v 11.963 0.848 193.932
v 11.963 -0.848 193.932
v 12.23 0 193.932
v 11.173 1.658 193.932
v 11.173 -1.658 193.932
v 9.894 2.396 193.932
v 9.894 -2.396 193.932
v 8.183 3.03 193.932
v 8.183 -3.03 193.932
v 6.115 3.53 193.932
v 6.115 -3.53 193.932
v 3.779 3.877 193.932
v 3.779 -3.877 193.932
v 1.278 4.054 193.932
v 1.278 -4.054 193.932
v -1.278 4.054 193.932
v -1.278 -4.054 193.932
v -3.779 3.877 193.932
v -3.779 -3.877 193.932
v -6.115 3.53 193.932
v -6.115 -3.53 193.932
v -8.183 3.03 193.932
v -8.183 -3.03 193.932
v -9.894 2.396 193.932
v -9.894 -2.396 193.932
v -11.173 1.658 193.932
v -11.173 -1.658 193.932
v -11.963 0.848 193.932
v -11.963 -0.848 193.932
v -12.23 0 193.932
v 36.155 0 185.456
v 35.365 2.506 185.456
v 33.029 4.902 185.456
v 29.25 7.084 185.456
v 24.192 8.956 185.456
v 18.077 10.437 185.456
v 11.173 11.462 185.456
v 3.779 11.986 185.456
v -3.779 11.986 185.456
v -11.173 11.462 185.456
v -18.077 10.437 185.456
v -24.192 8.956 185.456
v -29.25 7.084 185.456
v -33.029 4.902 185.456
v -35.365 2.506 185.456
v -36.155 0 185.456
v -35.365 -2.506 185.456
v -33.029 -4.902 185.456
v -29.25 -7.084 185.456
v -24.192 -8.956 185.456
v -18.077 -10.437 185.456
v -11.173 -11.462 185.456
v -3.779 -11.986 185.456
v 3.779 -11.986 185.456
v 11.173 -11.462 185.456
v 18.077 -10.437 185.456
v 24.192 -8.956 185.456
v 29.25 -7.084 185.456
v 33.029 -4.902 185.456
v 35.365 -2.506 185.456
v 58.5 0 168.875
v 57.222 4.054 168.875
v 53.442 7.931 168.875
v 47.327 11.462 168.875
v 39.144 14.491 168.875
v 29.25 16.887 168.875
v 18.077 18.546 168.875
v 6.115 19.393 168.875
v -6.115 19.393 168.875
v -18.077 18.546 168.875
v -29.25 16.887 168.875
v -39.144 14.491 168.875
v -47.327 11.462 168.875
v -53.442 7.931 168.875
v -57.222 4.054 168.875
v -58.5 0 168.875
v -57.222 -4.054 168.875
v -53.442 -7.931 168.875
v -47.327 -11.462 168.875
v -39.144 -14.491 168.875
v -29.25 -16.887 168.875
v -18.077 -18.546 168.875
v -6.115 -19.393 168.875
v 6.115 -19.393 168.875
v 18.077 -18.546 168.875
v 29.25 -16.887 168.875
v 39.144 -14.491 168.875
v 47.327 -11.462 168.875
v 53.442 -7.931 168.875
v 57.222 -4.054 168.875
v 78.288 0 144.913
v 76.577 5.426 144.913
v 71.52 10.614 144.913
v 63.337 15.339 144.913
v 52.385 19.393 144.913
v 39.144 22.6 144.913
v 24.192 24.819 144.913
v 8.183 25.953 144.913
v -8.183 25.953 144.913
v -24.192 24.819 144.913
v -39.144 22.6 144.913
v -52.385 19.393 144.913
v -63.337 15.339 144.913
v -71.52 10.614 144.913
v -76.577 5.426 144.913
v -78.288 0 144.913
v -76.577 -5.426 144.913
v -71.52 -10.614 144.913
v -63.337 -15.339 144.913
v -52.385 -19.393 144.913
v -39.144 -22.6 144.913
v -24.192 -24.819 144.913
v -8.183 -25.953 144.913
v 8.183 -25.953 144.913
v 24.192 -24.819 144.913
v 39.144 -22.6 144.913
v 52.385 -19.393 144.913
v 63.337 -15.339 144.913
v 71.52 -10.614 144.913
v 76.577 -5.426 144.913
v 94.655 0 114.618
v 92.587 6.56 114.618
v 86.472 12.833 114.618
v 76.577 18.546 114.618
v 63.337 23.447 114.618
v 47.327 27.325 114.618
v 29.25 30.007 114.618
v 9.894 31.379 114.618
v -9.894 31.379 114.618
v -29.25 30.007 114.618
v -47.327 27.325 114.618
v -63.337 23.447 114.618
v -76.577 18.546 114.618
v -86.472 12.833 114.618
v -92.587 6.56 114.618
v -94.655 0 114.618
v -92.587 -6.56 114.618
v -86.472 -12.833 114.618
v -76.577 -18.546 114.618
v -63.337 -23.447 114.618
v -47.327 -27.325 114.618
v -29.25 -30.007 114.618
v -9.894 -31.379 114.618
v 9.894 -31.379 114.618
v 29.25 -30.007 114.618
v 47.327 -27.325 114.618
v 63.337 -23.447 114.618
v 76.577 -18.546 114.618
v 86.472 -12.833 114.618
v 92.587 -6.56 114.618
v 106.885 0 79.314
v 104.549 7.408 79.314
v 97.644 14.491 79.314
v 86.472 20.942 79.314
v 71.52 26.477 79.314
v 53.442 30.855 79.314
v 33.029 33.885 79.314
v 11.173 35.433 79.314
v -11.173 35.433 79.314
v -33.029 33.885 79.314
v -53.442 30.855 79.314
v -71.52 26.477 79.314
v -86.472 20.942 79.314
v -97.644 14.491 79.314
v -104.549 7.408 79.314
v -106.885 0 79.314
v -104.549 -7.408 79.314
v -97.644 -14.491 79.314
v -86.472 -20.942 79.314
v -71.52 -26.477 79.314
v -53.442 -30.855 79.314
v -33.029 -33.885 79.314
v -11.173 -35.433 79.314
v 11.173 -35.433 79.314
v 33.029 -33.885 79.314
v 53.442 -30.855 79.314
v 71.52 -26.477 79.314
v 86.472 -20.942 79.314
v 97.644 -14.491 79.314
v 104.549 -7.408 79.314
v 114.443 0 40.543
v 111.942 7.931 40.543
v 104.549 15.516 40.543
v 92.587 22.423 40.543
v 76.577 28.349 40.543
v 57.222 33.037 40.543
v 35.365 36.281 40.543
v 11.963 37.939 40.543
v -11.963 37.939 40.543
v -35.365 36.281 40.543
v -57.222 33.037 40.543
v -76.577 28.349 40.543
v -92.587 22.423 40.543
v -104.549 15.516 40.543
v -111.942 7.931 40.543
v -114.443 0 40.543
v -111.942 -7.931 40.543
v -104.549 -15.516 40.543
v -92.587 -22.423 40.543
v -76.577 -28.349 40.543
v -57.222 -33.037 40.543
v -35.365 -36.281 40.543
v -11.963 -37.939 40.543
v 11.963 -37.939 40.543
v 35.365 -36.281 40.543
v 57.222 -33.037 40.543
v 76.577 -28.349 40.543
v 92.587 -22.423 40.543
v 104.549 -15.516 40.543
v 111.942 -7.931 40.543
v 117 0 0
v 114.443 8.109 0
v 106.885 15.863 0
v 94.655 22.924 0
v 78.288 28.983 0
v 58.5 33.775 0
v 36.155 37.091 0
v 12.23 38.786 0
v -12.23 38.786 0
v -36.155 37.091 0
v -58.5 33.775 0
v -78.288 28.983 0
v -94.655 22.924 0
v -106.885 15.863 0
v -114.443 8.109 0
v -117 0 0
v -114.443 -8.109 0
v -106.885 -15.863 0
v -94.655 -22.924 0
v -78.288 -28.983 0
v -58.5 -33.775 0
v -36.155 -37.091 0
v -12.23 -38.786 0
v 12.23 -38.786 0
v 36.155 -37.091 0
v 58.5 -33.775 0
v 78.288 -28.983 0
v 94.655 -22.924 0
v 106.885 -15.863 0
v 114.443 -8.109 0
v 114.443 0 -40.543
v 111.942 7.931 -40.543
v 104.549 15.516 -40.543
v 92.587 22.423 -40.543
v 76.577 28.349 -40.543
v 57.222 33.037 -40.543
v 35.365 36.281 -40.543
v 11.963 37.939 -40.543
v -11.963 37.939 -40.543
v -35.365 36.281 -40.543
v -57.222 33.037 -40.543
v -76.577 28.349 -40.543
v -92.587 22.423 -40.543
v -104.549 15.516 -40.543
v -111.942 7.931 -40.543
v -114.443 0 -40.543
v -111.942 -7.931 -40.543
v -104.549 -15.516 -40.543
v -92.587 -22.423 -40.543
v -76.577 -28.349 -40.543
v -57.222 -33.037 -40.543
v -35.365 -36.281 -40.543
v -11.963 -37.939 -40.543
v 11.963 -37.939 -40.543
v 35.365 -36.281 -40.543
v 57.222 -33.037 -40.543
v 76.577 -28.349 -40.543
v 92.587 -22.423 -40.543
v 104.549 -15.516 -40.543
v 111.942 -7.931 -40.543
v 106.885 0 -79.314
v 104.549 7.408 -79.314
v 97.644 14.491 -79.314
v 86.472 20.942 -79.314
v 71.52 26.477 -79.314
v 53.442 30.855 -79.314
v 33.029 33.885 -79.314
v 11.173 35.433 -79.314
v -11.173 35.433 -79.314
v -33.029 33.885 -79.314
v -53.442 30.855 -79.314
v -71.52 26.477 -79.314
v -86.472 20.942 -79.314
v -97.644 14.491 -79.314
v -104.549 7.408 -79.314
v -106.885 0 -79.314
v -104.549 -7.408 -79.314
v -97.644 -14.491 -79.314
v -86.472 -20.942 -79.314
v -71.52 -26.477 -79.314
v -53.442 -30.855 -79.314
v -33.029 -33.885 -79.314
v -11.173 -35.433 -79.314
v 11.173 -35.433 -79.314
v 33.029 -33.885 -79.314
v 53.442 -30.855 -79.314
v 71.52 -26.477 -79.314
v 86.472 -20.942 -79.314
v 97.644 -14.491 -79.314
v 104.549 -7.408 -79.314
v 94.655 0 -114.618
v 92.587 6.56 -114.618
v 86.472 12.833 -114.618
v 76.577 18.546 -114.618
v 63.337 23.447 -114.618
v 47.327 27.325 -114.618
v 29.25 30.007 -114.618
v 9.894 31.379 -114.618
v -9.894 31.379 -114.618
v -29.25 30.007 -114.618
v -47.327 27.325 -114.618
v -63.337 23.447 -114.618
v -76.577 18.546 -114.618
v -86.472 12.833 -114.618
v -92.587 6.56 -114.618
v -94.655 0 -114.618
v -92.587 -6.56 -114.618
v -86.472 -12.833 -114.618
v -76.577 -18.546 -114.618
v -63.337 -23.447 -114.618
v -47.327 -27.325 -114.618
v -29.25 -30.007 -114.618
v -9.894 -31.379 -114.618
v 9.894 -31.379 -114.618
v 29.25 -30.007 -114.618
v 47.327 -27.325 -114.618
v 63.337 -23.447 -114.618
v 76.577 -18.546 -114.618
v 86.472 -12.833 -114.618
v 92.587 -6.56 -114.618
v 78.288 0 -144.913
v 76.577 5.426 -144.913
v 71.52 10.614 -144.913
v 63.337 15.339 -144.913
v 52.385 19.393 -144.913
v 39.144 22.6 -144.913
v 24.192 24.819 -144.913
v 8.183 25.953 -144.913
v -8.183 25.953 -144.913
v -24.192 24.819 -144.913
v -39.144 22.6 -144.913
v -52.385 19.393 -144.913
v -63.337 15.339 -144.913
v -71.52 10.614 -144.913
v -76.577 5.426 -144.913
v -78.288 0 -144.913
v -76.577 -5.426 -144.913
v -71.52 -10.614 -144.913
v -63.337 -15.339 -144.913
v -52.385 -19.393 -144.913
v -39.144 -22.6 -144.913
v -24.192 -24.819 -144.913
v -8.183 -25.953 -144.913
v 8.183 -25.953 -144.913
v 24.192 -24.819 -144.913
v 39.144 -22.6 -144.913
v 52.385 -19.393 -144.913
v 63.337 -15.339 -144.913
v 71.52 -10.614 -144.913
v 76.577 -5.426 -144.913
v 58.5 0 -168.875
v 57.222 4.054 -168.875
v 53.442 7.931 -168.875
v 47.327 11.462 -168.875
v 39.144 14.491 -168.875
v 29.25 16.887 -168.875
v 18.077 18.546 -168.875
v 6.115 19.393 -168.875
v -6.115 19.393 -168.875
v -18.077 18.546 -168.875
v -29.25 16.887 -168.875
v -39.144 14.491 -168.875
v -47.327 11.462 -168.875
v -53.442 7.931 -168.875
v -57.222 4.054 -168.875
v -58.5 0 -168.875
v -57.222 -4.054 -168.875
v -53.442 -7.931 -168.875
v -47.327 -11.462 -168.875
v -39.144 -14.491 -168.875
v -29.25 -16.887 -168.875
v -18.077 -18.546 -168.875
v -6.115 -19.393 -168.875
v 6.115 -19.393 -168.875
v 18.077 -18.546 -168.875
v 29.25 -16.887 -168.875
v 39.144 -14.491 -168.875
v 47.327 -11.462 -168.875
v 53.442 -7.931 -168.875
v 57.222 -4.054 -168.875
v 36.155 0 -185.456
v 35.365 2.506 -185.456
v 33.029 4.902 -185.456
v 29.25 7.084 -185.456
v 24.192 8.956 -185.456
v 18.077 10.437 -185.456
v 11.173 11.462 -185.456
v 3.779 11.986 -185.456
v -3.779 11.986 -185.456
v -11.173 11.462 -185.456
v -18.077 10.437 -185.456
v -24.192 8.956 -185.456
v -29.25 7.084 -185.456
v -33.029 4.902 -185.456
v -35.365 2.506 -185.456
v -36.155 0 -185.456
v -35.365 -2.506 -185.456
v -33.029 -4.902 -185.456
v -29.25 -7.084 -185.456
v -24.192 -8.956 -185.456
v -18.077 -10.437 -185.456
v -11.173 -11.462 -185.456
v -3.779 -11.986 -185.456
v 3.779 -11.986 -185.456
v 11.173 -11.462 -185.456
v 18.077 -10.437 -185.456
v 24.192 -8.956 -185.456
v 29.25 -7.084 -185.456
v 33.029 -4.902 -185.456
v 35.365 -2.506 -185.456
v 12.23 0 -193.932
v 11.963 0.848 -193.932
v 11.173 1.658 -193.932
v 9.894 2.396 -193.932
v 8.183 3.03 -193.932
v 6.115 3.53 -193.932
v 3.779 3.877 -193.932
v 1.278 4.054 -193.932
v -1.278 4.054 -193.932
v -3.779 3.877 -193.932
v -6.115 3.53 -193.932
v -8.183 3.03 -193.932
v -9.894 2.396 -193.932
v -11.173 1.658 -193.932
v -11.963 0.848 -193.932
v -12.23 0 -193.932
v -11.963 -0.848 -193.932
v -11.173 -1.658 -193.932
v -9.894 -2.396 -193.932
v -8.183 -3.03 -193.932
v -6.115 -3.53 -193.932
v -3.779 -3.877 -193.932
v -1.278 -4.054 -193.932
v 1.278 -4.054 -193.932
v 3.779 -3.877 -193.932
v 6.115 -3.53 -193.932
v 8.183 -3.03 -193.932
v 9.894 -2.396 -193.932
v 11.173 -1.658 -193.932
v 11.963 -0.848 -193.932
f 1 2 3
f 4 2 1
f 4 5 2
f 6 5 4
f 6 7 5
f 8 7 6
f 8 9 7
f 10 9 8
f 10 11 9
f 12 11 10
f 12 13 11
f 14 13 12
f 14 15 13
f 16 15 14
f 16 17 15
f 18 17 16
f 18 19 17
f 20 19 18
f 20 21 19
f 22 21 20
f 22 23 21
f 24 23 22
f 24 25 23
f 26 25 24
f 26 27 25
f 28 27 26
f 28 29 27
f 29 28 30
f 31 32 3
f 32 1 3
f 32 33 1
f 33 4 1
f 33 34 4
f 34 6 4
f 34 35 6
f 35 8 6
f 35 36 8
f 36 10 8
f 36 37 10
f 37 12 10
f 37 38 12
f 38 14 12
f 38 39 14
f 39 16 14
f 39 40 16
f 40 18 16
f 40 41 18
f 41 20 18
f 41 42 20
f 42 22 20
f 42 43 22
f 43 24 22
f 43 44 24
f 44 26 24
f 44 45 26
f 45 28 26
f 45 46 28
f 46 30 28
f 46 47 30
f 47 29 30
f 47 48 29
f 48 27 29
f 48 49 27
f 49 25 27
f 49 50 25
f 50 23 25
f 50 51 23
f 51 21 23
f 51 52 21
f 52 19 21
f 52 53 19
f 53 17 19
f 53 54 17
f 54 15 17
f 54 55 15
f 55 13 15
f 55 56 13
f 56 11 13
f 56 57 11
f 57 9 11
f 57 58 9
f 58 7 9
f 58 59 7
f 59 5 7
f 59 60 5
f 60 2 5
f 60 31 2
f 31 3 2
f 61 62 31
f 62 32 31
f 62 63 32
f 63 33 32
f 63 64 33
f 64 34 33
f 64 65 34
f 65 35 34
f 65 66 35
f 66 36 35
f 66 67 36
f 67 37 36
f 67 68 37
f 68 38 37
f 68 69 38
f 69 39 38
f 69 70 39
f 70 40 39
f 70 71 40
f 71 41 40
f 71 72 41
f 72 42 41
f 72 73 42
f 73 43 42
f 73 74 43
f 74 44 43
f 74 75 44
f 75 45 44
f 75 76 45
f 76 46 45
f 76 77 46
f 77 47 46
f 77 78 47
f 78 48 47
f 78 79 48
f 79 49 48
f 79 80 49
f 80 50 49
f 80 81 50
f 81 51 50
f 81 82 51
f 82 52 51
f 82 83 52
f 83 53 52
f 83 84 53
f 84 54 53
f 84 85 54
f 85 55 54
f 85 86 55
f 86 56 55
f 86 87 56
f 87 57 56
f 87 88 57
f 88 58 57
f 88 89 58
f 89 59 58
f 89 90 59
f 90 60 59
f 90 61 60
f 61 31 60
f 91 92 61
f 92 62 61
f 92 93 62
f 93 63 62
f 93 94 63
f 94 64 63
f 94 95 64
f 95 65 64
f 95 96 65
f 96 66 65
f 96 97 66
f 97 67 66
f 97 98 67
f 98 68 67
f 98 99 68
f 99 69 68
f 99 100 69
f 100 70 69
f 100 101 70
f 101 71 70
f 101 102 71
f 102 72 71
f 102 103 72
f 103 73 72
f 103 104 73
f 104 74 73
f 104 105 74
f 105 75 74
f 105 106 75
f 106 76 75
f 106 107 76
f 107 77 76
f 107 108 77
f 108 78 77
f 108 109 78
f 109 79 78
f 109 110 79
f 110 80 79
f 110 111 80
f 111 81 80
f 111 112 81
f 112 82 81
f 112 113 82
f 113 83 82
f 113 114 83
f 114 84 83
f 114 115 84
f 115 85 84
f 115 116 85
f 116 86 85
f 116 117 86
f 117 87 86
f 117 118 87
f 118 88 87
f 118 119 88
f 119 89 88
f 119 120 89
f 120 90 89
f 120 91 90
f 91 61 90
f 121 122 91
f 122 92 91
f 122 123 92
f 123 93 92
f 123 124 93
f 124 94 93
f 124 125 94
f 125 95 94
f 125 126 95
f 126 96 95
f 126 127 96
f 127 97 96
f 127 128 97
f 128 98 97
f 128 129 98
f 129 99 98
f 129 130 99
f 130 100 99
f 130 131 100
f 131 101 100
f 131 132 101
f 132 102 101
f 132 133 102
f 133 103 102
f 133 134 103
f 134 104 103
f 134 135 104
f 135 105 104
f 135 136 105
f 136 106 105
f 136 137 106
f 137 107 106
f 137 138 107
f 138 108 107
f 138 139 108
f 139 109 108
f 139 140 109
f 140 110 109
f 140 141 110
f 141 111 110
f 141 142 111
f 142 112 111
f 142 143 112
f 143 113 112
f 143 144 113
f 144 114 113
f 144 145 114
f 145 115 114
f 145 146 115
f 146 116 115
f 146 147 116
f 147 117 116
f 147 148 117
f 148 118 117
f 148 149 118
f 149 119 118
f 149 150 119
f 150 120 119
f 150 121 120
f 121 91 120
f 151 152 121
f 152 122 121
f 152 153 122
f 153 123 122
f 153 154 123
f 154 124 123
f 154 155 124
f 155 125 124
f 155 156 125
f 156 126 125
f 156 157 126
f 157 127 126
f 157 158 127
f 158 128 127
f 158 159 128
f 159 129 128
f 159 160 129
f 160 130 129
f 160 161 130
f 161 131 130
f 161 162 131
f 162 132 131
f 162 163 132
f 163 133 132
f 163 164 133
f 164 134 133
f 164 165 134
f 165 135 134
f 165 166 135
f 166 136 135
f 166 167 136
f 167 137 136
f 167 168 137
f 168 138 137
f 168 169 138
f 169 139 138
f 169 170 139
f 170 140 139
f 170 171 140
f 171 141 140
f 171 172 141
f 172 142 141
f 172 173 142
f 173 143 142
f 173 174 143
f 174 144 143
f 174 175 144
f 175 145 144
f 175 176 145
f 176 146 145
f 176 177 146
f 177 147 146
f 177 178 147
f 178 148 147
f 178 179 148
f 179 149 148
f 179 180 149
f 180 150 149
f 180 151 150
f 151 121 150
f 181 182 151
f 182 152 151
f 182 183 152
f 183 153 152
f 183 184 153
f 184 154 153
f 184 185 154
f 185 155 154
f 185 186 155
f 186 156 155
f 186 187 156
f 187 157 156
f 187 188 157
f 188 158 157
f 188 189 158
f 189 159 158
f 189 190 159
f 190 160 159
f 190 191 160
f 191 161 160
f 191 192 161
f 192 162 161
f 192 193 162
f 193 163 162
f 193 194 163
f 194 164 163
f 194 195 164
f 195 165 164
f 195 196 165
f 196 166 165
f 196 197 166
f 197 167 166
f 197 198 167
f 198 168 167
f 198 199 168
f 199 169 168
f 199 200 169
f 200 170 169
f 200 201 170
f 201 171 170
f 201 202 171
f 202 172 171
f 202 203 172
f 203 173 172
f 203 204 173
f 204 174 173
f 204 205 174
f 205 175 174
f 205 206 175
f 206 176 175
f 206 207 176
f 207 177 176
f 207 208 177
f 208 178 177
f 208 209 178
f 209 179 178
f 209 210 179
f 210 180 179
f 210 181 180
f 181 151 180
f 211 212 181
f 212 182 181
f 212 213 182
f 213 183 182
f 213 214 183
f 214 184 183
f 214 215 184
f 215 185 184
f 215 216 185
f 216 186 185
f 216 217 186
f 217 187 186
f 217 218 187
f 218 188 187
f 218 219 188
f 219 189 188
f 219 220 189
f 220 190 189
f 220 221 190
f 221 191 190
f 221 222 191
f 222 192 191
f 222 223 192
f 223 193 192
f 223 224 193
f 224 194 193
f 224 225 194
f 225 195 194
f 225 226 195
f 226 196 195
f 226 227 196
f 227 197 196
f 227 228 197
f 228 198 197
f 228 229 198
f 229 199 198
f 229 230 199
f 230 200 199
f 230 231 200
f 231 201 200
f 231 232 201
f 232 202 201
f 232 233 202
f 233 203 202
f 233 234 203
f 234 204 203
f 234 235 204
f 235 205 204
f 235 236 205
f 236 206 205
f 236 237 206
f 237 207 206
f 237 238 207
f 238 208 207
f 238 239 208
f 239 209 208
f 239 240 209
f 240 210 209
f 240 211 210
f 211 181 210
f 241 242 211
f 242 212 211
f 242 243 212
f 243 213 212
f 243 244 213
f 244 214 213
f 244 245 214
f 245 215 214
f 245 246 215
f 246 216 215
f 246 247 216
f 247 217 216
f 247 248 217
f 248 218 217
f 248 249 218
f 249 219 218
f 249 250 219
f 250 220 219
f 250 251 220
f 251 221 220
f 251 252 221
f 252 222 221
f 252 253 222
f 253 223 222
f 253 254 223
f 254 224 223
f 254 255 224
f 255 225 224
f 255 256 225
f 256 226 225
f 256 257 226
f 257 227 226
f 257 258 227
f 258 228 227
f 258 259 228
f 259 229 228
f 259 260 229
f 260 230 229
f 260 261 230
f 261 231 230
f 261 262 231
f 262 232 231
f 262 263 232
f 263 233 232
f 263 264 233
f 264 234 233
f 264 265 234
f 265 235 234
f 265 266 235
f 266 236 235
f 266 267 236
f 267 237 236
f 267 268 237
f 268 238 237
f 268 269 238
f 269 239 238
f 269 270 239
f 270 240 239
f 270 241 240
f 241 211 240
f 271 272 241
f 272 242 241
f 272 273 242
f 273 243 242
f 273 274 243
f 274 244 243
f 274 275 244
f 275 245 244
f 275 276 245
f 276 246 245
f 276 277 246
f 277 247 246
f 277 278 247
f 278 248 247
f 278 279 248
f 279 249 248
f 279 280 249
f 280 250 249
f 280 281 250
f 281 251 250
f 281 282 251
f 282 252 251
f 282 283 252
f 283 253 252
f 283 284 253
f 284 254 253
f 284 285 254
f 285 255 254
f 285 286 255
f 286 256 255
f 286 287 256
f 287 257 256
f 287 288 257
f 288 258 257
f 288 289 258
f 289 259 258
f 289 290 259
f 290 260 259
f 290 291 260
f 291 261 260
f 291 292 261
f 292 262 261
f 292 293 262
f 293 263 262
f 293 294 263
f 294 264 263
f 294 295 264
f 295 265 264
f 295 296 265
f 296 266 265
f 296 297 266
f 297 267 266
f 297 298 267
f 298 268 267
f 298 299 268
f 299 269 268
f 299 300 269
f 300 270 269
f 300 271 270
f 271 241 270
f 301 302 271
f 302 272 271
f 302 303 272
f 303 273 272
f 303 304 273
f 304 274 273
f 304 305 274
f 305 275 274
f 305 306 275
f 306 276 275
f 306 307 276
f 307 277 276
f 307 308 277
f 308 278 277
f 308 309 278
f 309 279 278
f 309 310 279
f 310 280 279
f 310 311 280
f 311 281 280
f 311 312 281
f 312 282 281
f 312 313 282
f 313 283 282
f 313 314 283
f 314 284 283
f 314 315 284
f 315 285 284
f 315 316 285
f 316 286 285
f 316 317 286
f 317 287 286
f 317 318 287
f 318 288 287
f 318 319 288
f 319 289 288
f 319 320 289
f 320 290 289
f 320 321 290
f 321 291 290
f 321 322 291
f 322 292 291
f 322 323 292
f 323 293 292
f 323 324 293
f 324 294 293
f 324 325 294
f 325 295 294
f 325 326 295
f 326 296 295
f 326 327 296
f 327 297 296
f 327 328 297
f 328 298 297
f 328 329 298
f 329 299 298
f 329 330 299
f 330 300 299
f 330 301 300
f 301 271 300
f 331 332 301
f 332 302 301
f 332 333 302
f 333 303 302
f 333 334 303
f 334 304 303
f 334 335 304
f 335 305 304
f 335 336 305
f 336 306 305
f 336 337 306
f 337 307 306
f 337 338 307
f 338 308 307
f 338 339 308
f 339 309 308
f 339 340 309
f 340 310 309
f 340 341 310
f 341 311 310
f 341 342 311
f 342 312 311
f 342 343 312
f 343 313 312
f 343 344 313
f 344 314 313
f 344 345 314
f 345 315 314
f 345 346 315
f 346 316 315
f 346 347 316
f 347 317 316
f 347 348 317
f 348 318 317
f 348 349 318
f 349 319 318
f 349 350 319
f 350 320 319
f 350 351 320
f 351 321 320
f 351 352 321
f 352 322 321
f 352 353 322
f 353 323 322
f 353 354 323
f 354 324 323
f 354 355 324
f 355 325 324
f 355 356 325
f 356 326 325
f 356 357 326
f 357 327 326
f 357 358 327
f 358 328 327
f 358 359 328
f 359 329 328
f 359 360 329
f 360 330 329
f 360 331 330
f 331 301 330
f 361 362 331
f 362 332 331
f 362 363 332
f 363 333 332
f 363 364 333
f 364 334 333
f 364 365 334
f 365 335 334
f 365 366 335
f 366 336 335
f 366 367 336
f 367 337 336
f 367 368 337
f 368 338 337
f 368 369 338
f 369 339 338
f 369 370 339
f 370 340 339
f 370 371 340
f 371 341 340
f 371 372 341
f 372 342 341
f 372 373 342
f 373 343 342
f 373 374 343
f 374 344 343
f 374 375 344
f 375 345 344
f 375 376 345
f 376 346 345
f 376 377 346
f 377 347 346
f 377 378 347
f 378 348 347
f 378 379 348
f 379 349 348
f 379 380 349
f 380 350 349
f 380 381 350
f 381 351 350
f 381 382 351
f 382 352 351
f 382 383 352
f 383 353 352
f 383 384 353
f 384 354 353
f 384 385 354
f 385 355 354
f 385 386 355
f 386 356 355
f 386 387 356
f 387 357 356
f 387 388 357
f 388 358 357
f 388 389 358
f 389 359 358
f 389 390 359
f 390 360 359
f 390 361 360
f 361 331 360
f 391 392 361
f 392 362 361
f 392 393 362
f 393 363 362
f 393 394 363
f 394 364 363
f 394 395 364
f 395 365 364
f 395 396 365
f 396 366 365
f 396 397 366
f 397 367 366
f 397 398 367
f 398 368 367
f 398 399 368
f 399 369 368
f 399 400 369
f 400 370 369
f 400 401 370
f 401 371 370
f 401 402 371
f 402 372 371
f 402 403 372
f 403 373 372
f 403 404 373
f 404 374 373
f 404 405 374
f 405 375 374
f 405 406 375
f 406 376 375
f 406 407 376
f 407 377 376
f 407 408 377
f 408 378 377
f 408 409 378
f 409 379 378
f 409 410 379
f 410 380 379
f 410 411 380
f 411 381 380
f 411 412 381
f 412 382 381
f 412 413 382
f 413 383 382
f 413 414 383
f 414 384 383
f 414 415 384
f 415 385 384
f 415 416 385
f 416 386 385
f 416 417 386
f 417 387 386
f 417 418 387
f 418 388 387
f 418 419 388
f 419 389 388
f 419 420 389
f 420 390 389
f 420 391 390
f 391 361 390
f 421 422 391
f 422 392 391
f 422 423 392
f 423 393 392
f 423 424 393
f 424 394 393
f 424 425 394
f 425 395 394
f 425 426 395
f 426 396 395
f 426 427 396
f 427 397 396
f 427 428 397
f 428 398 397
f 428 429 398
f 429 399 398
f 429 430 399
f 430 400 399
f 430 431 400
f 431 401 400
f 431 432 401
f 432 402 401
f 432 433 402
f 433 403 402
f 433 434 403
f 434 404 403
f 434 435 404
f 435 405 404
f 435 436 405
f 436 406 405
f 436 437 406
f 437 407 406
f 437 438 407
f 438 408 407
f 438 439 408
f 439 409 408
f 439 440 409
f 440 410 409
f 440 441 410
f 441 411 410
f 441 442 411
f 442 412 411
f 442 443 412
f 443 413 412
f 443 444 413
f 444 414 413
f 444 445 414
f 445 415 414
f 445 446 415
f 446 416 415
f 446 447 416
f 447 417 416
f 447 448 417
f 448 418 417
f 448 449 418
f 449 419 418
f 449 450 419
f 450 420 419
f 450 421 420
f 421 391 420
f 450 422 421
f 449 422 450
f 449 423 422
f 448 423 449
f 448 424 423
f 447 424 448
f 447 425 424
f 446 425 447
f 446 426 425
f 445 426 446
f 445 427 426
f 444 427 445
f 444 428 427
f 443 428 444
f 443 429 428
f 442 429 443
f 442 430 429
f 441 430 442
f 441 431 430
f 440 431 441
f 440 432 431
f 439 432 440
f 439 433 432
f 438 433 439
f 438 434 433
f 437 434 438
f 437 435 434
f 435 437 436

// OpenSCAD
// Generated by SolidPython 1.0.1 on 2020-07-29 00:46:48


scale(v = [9, 3, 15]) {
	sphere(r = 13);
}
/***********************************************
*********      SolidPython code:      **********
************************************************
 
# import packages: SolidPython
from solid import *
from solid.utils import *
from itertools import chain, combinations, permutations


class Resize:

    def __init__(self, scad_file):
        self.scad_file = scad_file
        #self.scad_file = import_scad(scad_file)
        # cone/cylinder param:
        self.r1 = 0
        self.r2 = 0
        self.h = 0
        # rectangular prism param:
        self.w = 0
        self.l = 0
        # ellipse param:
        self.r = 0

    # import OpenScad code (file name corresponds to shape)


    # classify shape + parameters
    def assign(self, param1, param2, param3):
        if self.scad_file == 'cone.scad':
            self.r1 = param1
            self.r2 = param2
            self.h = param3
        elif self.scad_file == 'cylinder.scad':
            self.r1 = param1
            self.r2 = param2
            self.h = param3
        elif self.scad_file == 'rectangularPrism.scad':
            self.h = param1
            self.l = param2
            self.w = param3
        else:
            self.r = param1
            self.h = param2

    # resize parameters
    def iterate(self):
        x = range(3, 20, 2)
        i = 1
        if self.scad_file == 'cone.scad':
            tempList = list(permutations(x, 2))
            for temp in tempList:
                param1 = temp[0]
                param2 = temp[1]
                filepath = 'produced_scad_files/' + 'cone' + str(param1) + '_' + str(param2) + '_' + '.scad'
                scad_render_to_file(cylinder(h=param1, r1=param2, r2=0), filepath)

        elif self.scad_file == 'cylinder.scad':
            tempList = list(permutations(x, 3))
            for temp in tempList:
                param1 = temp[0]
                param2 = temp[1]
                filepath = 'produced_scad_files/' + 'cylinder' + str(param1) + '_' + str(param2) + '_' + '.scad'
                scad_render_to_file(cylinder(h=param1, r1=param2, r2=param2), filepath)

        elif self.scad_file == 'rectangularPrism.scad':
            tempList = list(permutations(x, 3))
            for temp in tempList:
                param1 = temp[0]
                param2 = temp[1]
                param3 = temp[2]
                filepath = 'produced_scad_files/' + 'rectangularPrism' + str(param1) + '_' + str(param2) + '_' + str(
                    param3) + '.scad'
                scad_render_to_file(cube(size=(param1, param2, param3)), filepath)

        elif self.scad_file == 'ellipse.scad':
            tempList = list(permutations(x, 4))
            for temp in tempList:
                param1 = temp[0]
                param2 = temp[1]
                param3 = temp[2]
                param4 = temp[3]
                filepath = 'produced_scad_files/' + 'ellipse' + str(param1) + '_' + str(param2) + '_' + str(param3) + '_' + str(param4) + '.scad'
                scad_render_to_file(scale([param1, param2, param3])(sphere(r=param4)), filepath)

    def render_to_scadfile(self):
        scad_render_to_file(scad, 'example.scad') 
 
************************************************/
